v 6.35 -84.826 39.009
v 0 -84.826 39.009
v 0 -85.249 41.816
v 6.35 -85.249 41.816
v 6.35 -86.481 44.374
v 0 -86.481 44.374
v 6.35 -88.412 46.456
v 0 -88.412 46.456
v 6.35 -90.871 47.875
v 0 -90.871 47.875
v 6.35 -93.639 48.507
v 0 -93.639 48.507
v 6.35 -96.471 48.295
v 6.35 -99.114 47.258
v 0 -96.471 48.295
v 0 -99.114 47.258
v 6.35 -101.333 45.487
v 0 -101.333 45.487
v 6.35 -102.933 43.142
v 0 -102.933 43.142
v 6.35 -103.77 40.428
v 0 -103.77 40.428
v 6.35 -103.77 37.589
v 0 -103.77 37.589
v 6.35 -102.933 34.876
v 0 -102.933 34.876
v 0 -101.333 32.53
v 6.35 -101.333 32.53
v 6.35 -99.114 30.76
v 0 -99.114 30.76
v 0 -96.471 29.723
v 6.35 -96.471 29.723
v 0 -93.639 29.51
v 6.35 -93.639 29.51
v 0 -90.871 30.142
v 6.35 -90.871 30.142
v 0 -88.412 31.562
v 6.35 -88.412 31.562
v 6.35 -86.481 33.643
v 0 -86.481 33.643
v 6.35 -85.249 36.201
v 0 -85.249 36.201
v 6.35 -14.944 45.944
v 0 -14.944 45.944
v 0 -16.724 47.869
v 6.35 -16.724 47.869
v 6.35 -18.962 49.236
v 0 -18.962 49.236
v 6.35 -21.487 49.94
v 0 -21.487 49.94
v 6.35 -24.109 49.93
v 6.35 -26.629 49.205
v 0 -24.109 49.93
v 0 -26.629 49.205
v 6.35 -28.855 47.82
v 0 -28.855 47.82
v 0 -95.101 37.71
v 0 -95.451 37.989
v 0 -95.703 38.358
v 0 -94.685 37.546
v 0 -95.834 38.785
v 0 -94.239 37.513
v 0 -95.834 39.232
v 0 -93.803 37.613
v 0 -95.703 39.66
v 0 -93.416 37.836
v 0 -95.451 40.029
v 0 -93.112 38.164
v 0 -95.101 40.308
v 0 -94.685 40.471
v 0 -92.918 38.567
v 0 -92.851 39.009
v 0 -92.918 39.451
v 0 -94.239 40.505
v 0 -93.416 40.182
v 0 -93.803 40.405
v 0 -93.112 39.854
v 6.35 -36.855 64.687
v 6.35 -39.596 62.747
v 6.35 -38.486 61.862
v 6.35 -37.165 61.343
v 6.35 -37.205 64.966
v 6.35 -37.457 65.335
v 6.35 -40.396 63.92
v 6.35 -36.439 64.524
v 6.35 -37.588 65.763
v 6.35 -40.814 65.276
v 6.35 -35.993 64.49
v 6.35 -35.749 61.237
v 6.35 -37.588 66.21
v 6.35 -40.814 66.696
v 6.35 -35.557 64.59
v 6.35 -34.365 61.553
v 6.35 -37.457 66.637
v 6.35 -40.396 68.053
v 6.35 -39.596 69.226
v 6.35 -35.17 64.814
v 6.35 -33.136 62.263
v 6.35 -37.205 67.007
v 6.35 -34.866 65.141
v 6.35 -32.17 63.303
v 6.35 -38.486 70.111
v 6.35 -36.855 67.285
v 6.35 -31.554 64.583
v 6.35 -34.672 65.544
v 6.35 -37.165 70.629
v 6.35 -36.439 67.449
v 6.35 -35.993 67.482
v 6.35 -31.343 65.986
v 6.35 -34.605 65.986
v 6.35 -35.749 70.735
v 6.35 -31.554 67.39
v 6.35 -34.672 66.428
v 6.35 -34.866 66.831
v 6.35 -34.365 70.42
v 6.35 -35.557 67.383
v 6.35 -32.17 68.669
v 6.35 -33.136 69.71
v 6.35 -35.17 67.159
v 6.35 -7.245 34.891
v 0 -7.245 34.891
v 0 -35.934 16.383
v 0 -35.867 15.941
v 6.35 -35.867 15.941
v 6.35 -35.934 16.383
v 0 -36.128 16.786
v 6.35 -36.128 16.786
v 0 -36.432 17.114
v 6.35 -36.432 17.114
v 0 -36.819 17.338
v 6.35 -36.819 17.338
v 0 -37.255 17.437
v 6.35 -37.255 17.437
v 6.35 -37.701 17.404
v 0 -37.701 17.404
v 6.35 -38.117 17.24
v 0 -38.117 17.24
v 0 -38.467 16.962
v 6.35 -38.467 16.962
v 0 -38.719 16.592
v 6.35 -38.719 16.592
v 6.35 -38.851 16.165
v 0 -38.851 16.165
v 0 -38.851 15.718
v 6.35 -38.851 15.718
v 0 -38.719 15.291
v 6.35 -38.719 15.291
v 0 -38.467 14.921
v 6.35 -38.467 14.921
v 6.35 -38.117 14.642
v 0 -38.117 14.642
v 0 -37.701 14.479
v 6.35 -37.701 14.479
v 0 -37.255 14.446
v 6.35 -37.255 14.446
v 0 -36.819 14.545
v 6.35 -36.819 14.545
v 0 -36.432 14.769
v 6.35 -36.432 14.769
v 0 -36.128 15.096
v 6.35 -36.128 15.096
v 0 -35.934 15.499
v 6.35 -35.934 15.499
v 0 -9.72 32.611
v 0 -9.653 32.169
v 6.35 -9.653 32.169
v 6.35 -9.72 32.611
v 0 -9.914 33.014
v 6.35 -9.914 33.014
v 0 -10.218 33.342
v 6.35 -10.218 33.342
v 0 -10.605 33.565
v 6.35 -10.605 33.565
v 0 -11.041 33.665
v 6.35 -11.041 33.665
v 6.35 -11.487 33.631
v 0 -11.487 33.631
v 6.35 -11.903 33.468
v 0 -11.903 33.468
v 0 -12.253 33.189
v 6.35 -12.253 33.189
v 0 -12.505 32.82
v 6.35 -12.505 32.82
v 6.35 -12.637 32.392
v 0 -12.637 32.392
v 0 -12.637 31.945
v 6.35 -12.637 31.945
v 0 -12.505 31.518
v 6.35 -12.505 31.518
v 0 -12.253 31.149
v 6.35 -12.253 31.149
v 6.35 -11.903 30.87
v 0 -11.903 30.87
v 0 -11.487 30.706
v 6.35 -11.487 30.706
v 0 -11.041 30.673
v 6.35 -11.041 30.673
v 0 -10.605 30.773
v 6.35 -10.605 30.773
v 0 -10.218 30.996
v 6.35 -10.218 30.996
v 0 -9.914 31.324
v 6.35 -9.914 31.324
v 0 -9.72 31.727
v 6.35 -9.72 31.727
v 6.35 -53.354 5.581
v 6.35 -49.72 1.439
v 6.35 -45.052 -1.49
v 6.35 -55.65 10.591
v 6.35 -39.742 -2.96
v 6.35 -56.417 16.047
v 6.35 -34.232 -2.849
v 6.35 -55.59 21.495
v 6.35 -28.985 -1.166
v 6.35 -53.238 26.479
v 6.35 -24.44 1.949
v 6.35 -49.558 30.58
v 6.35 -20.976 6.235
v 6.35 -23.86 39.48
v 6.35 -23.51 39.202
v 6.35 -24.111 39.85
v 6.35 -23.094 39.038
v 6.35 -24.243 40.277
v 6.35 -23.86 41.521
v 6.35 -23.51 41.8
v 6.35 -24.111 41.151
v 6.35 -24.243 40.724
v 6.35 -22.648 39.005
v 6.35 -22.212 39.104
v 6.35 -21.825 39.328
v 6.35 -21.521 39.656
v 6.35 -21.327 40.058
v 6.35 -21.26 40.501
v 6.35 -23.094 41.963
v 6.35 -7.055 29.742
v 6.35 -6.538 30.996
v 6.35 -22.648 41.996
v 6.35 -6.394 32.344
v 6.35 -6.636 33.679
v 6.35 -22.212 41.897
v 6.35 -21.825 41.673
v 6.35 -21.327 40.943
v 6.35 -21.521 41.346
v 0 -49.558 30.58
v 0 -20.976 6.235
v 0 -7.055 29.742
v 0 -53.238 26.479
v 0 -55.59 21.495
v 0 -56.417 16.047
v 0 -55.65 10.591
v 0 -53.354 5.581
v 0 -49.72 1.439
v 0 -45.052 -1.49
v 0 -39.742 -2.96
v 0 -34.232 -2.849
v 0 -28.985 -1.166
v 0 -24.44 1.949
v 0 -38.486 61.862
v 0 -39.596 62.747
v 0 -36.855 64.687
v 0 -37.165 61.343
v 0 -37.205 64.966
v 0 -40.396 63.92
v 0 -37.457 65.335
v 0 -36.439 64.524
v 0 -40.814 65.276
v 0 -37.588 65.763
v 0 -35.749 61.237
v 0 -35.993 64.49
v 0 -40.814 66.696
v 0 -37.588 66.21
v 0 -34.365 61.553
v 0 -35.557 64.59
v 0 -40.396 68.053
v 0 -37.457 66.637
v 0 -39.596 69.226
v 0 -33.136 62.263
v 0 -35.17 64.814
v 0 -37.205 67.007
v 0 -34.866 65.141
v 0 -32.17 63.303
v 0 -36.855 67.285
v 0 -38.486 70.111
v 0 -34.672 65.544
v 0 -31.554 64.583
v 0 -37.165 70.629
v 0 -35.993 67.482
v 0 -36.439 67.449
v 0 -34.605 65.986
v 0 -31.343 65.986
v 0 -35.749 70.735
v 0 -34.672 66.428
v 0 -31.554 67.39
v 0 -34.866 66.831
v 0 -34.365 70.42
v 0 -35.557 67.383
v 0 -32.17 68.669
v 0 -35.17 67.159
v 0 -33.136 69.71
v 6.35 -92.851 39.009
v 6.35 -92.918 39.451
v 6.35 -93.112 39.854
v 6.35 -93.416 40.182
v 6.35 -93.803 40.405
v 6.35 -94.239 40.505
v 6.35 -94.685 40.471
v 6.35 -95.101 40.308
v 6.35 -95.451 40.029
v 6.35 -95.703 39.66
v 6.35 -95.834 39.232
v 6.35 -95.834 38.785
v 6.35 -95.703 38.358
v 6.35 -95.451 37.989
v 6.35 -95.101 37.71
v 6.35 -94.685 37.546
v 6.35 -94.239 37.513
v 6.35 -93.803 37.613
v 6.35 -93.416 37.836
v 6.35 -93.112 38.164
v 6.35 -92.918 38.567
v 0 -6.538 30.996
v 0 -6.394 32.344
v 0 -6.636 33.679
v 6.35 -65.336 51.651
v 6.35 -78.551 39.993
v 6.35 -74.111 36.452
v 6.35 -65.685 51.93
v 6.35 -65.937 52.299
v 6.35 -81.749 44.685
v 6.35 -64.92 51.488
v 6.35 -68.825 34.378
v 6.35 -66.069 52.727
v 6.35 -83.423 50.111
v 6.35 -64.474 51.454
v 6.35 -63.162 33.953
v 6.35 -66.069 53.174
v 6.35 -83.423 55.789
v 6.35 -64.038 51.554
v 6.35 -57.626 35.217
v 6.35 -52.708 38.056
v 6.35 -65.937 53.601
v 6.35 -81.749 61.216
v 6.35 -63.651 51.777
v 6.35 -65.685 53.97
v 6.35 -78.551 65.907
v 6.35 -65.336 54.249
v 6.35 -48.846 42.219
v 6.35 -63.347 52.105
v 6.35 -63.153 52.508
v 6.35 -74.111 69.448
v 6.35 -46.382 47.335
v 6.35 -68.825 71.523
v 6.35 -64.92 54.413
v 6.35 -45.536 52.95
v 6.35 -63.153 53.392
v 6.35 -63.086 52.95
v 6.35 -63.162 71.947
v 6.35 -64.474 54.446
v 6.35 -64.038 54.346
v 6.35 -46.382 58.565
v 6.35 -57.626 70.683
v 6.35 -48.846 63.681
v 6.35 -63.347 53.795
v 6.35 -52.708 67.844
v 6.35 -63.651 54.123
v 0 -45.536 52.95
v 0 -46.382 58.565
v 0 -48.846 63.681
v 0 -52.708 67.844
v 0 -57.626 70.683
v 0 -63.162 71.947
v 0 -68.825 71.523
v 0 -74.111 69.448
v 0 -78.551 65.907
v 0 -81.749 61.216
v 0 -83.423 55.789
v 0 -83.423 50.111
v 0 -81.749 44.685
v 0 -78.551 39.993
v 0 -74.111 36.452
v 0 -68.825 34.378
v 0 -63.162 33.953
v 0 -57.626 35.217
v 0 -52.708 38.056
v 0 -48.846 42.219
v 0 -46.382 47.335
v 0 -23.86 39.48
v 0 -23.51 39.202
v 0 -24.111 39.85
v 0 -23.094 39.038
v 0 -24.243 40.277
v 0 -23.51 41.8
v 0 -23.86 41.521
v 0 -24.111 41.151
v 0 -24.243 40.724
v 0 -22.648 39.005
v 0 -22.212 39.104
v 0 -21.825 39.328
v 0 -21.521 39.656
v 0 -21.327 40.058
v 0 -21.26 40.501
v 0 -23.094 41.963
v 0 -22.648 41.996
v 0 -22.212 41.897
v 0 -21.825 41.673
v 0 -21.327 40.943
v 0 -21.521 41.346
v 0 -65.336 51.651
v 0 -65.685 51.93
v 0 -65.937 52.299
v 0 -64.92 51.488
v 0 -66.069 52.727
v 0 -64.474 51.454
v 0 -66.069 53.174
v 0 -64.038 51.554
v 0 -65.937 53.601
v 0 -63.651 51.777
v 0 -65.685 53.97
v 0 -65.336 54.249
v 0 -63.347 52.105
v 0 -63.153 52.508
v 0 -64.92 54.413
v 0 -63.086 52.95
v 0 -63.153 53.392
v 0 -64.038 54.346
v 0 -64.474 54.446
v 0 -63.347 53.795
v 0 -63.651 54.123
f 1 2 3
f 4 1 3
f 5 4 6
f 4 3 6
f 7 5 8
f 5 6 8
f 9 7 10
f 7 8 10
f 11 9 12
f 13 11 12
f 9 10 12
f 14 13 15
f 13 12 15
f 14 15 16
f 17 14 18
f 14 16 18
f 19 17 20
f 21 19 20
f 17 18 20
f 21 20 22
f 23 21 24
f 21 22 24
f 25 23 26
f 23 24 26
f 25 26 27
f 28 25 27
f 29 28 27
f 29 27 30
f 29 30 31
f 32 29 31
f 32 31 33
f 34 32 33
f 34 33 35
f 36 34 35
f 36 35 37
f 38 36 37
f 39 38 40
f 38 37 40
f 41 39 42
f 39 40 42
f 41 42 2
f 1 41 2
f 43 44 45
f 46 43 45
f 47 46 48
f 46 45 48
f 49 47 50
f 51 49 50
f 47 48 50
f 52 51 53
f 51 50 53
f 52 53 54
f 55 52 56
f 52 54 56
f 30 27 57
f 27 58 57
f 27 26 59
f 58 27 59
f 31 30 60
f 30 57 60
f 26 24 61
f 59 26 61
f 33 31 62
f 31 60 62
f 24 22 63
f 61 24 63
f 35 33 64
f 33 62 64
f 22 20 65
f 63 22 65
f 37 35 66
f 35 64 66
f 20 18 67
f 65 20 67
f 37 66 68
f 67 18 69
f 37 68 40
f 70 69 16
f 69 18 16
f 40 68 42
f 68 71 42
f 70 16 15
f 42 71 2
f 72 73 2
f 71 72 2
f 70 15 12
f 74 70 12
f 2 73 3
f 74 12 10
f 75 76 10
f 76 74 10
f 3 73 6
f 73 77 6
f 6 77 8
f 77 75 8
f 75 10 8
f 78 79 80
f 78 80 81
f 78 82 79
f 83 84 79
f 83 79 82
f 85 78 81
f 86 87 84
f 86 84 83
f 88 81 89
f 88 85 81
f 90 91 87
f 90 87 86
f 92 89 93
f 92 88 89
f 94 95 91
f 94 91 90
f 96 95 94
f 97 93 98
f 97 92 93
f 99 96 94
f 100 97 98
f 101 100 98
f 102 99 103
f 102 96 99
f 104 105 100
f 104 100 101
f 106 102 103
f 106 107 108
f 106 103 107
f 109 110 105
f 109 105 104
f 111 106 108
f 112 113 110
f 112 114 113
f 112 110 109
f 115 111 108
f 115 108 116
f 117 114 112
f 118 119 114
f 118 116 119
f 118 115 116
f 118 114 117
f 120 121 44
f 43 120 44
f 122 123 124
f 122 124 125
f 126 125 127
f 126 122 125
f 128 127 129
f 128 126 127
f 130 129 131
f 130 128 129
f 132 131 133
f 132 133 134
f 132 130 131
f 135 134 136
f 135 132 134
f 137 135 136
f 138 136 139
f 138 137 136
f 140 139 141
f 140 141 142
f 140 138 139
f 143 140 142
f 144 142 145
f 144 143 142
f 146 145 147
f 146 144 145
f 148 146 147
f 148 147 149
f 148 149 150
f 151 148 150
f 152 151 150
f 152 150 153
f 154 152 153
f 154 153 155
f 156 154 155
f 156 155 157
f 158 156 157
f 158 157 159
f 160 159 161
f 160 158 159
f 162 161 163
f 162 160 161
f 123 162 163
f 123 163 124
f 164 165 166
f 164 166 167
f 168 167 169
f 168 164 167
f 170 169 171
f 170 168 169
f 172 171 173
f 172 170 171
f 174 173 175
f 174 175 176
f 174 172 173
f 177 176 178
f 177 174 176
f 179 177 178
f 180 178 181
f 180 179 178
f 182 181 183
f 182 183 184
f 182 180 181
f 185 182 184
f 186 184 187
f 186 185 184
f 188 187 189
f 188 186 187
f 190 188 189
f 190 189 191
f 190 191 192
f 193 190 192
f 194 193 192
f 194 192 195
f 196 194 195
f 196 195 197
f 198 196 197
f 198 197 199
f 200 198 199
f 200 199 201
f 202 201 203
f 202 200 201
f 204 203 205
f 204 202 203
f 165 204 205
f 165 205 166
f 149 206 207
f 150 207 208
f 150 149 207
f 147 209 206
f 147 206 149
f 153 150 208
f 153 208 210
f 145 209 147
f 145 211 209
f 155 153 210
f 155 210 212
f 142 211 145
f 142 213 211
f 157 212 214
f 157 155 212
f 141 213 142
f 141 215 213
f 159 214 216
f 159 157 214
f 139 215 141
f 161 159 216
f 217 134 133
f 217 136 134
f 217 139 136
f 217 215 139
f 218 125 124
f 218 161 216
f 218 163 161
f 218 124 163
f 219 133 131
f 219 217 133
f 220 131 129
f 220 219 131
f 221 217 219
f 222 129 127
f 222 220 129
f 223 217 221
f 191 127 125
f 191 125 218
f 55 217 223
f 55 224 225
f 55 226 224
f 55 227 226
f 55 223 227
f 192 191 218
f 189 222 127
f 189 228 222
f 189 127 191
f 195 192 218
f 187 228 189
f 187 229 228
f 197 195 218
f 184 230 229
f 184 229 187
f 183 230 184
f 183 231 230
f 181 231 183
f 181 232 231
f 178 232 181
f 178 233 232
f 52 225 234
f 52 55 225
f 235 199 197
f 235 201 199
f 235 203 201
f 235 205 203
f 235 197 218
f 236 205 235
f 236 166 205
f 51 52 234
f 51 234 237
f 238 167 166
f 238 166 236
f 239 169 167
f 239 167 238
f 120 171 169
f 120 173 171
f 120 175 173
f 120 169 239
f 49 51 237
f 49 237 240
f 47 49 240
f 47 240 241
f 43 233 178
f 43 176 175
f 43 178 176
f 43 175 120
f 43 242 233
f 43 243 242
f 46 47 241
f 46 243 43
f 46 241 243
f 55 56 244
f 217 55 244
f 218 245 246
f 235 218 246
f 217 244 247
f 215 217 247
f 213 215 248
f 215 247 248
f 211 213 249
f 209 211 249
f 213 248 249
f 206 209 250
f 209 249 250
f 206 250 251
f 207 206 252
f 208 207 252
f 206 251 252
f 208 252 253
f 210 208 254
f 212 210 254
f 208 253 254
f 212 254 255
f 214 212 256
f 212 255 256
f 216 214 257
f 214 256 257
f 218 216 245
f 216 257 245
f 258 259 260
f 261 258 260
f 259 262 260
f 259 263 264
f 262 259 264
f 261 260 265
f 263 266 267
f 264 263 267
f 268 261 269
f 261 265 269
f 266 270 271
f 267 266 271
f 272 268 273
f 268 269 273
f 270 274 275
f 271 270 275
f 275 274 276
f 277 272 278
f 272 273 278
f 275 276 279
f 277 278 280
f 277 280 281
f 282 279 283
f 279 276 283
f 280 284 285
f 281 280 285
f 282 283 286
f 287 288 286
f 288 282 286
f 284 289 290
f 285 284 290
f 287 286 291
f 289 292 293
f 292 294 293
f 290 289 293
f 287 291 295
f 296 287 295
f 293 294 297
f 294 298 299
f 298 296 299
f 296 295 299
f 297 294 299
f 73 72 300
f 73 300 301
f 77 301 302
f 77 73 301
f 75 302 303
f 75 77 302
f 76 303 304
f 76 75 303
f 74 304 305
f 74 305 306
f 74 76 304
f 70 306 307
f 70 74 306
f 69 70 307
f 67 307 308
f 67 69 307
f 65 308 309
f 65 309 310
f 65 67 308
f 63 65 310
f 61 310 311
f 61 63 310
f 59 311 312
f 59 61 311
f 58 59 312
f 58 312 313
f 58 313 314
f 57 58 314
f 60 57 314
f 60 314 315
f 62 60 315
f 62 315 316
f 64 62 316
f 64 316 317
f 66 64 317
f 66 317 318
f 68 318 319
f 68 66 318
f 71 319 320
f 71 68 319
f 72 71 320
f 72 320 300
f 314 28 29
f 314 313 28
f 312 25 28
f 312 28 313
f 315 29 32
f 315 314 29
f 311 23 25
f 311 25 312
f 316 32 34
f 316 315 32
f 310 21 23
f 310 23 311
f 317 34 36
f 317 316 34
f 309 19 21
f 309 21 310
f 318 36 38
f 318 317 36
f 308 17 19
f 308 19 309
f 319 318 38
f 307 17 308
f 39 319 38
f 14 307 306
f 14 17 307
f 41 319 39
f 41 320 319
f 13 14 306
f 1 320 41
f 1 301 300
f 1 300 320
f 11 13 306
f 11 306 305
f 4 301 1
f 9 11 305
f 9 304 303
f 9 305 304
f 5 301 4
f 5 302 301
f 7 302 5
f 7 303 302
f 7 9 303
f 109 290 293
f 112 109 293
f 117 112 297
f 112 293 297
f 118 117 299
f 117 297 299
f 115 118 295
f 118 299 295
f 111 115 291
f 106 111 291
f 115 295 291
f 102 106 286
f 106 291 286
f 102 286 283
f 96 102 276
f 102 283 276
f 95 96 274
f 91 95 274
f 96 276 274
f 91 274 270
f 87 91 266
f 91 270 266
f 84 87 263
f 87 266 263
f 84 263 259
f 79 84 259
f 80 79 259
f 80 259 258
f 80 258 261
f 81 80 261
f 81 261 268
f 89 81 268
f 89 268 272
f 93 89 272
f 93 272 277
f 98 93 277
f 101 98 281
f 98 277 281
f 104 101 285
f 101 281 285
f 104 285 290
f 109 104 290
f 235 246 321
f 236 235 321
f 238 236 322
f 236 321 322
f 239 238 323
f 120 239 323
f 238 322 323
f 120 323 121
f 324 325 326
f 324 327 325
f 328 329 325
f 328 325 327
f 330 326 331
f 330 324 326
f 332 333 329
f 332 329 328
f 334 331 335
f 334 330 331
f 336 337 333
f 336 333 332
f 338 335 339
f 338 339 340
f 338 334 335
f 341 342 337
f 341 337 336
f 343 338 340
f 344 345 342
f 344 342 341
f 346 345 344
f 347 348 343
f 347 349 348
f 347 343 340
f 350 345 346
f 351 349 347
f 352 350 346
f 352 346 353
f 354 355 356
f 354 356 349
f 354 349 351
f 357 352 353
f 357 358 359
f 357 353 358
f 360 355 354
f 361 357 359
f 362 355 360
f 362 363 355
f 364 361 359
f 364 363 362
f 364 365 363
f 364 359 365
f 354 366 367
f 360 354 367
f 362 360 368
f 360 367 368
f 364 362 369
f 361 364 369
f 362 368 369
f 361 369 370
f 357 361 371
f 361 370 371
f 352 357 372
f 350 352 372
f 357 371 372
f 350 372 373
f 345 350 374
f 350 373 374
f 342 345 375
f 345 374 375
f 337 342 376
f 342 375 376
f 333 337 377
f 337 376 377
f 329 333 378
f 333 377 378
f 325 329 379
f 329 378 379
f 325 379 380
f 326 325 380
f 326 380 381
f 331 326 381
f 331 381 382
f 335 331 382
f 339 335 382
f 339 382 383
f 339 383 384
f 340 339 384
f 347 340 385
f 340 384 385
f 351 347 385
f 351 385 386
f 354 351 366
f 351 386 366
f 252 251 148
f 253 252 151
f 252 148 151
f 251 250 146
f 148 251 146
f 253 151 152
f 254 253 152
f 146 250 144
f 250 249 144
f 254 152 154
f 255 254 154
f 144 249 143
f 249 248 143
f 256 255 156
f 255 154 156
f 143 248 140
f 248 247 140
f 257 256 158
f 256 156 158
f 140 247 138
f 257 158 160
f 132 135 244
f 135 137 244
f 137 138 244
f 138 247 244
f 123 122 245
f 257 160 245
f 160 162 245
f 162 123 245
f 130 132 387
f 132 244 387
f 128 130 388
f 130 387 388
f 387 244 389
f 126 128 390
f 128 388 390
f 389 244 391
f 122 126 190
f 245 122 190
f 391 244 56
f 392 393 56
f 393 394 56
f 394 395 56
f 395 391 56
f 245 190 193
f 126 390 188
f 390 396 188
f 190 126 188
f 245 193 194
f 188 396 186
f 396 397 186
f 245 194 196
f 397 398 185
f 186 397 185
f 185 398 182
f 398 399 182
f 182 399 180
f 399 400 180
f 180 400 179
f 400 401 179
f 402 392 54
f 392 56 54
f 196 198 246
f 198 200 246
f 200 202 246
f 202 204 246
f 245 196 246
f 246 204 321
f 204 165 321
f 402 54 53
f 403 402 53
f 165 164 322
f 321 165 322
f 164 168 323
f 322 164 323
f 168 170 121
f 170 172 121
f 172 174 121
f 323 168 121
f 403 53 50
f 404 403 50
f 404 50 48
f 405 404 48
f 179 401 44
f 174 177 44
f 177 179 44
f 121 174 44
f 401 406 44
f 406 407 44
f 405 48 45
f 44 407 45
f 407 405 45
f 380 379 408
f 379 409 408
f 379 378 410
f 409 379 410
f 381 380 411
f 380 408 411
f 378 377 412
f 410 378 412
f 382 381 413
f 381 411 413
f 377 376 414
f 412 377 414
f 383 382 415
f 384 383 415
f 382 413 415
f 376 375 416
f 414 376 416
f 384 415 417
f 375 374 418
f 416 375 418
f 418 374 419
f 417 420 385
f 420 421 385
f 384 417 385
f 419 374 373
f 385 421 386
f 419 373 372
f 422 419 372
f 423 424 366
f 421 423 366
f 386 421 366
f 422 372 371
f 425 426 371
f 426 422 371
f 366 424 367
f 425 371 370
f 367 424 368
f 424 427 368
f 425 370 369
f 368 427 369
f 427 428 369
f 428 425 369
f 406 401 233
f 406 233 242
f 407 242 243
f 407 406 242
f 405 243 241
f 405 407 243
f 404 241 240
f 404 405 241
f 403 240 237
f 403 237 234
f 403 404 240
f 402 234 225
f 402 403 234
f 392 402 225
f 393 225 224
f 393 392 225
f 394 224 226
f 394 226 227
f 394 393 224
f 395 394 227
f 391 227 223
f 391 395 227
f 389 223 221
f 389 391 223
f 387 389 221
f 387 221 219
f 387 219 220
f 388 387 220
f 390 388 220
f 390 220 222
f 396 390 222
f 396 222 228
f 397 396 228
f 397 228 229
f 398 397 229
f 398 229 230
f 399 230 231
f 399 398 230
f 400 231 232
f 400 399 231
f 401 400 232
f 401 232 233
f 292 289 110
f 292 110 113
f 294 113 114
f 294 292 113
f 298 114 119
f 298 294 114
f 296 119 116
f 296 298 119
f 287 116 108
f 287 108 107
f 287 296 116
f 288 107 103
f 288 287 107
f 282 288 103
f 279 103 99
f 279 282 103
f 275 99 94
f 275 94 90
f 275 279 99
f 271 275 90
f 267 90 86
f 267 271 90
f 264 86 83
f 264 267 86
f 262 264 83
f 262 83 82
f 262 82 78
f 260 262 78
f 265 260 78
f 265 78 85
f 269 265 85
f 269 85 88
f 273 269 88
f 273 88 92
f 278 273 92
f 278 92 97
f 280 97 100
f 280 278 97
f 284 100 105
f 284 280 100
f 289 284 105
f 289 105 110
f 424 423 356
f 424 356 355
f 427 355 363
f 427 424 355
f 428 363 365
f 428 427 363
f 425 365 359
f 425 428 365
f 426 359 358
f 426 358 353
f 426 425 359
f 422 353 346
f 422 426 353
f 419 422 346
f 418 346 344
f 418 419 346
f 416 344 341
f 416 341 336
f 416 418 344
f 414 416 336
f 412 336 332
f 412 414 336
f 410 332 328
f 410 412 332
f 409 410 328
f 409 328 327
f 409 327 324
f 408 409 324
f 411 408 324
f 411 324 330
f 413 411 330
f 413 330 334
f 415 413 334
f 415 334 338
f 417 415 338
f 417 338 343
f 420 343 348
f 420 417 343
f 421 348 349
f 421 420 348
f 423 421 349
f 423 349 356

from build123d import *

# Parameters (mm, degrees)
F0_R     = 1.499997
F0_R_2   = 9.525
F0_R_3   = 19.05
F0_R_4   = 4.7625
F1_DEPTH = 6.35


with BuildPart() as f1:
    # F0 (on Right) → F1 (new body)
    with BuildSketch(Plane.YZ):
        with BuildLine():
            Line((-20.975642, 6.234786), (-7.0554, 29.742179))
            ThreePointArc((-7.0554, 29.742179), (-6.394042, 32.344319), (-7.245258, 34.890681))
            Line((-7.245258, 34.890681), (-14.943859, 45.944314))
            ThreePointArc((-14.943859, 45.944314), (-21.487185, 49.940161), (-28.855151, 47.820024))
            Line((-28.855151, 47.820024), (-49.557661, 30.580212))
            ThreePointArc((-49.557661, 30.580212), (-49.719906, 1.439088), (-20.975642, 6.234786))
        make_face()
        with Locations((-37.367273, 15.941327)):
            Circle(F0_R, mode=Mode.SUBTRACT)
        with Locations((-11.153307, 32.168815)):
            Circle(F0_R, mode=Mode.SUBTRACT)
        with Locations((-22.759957, 40.500581)):
            Circle(F0_R, mode=Mode.SUBTRACT)
        with Locations((-94.351119, 39.008833)):
            Circle(F0_R_2)
        with Locations((-94.351119, 39.008833)):
            Circle(F0_R, mode=Mode.SUBTRACT)
        with Locations((-64.585872, 52.950151)):
            Circle(F0_R_3)
        with Locations((-64.585872, 52.950151)):
            Circle(F0_R, mode=Mode.SUBTRACT)
        with Locations((-36.105146, 65.986276)):
            Circle(F0_R_4)
        with Locations((-36.105146, 65.986276)):
            Circle(F0_R, mode=Mode.SUBTRACT)
    extrude(amount=F1_DEPTH)


solid = f1.part
